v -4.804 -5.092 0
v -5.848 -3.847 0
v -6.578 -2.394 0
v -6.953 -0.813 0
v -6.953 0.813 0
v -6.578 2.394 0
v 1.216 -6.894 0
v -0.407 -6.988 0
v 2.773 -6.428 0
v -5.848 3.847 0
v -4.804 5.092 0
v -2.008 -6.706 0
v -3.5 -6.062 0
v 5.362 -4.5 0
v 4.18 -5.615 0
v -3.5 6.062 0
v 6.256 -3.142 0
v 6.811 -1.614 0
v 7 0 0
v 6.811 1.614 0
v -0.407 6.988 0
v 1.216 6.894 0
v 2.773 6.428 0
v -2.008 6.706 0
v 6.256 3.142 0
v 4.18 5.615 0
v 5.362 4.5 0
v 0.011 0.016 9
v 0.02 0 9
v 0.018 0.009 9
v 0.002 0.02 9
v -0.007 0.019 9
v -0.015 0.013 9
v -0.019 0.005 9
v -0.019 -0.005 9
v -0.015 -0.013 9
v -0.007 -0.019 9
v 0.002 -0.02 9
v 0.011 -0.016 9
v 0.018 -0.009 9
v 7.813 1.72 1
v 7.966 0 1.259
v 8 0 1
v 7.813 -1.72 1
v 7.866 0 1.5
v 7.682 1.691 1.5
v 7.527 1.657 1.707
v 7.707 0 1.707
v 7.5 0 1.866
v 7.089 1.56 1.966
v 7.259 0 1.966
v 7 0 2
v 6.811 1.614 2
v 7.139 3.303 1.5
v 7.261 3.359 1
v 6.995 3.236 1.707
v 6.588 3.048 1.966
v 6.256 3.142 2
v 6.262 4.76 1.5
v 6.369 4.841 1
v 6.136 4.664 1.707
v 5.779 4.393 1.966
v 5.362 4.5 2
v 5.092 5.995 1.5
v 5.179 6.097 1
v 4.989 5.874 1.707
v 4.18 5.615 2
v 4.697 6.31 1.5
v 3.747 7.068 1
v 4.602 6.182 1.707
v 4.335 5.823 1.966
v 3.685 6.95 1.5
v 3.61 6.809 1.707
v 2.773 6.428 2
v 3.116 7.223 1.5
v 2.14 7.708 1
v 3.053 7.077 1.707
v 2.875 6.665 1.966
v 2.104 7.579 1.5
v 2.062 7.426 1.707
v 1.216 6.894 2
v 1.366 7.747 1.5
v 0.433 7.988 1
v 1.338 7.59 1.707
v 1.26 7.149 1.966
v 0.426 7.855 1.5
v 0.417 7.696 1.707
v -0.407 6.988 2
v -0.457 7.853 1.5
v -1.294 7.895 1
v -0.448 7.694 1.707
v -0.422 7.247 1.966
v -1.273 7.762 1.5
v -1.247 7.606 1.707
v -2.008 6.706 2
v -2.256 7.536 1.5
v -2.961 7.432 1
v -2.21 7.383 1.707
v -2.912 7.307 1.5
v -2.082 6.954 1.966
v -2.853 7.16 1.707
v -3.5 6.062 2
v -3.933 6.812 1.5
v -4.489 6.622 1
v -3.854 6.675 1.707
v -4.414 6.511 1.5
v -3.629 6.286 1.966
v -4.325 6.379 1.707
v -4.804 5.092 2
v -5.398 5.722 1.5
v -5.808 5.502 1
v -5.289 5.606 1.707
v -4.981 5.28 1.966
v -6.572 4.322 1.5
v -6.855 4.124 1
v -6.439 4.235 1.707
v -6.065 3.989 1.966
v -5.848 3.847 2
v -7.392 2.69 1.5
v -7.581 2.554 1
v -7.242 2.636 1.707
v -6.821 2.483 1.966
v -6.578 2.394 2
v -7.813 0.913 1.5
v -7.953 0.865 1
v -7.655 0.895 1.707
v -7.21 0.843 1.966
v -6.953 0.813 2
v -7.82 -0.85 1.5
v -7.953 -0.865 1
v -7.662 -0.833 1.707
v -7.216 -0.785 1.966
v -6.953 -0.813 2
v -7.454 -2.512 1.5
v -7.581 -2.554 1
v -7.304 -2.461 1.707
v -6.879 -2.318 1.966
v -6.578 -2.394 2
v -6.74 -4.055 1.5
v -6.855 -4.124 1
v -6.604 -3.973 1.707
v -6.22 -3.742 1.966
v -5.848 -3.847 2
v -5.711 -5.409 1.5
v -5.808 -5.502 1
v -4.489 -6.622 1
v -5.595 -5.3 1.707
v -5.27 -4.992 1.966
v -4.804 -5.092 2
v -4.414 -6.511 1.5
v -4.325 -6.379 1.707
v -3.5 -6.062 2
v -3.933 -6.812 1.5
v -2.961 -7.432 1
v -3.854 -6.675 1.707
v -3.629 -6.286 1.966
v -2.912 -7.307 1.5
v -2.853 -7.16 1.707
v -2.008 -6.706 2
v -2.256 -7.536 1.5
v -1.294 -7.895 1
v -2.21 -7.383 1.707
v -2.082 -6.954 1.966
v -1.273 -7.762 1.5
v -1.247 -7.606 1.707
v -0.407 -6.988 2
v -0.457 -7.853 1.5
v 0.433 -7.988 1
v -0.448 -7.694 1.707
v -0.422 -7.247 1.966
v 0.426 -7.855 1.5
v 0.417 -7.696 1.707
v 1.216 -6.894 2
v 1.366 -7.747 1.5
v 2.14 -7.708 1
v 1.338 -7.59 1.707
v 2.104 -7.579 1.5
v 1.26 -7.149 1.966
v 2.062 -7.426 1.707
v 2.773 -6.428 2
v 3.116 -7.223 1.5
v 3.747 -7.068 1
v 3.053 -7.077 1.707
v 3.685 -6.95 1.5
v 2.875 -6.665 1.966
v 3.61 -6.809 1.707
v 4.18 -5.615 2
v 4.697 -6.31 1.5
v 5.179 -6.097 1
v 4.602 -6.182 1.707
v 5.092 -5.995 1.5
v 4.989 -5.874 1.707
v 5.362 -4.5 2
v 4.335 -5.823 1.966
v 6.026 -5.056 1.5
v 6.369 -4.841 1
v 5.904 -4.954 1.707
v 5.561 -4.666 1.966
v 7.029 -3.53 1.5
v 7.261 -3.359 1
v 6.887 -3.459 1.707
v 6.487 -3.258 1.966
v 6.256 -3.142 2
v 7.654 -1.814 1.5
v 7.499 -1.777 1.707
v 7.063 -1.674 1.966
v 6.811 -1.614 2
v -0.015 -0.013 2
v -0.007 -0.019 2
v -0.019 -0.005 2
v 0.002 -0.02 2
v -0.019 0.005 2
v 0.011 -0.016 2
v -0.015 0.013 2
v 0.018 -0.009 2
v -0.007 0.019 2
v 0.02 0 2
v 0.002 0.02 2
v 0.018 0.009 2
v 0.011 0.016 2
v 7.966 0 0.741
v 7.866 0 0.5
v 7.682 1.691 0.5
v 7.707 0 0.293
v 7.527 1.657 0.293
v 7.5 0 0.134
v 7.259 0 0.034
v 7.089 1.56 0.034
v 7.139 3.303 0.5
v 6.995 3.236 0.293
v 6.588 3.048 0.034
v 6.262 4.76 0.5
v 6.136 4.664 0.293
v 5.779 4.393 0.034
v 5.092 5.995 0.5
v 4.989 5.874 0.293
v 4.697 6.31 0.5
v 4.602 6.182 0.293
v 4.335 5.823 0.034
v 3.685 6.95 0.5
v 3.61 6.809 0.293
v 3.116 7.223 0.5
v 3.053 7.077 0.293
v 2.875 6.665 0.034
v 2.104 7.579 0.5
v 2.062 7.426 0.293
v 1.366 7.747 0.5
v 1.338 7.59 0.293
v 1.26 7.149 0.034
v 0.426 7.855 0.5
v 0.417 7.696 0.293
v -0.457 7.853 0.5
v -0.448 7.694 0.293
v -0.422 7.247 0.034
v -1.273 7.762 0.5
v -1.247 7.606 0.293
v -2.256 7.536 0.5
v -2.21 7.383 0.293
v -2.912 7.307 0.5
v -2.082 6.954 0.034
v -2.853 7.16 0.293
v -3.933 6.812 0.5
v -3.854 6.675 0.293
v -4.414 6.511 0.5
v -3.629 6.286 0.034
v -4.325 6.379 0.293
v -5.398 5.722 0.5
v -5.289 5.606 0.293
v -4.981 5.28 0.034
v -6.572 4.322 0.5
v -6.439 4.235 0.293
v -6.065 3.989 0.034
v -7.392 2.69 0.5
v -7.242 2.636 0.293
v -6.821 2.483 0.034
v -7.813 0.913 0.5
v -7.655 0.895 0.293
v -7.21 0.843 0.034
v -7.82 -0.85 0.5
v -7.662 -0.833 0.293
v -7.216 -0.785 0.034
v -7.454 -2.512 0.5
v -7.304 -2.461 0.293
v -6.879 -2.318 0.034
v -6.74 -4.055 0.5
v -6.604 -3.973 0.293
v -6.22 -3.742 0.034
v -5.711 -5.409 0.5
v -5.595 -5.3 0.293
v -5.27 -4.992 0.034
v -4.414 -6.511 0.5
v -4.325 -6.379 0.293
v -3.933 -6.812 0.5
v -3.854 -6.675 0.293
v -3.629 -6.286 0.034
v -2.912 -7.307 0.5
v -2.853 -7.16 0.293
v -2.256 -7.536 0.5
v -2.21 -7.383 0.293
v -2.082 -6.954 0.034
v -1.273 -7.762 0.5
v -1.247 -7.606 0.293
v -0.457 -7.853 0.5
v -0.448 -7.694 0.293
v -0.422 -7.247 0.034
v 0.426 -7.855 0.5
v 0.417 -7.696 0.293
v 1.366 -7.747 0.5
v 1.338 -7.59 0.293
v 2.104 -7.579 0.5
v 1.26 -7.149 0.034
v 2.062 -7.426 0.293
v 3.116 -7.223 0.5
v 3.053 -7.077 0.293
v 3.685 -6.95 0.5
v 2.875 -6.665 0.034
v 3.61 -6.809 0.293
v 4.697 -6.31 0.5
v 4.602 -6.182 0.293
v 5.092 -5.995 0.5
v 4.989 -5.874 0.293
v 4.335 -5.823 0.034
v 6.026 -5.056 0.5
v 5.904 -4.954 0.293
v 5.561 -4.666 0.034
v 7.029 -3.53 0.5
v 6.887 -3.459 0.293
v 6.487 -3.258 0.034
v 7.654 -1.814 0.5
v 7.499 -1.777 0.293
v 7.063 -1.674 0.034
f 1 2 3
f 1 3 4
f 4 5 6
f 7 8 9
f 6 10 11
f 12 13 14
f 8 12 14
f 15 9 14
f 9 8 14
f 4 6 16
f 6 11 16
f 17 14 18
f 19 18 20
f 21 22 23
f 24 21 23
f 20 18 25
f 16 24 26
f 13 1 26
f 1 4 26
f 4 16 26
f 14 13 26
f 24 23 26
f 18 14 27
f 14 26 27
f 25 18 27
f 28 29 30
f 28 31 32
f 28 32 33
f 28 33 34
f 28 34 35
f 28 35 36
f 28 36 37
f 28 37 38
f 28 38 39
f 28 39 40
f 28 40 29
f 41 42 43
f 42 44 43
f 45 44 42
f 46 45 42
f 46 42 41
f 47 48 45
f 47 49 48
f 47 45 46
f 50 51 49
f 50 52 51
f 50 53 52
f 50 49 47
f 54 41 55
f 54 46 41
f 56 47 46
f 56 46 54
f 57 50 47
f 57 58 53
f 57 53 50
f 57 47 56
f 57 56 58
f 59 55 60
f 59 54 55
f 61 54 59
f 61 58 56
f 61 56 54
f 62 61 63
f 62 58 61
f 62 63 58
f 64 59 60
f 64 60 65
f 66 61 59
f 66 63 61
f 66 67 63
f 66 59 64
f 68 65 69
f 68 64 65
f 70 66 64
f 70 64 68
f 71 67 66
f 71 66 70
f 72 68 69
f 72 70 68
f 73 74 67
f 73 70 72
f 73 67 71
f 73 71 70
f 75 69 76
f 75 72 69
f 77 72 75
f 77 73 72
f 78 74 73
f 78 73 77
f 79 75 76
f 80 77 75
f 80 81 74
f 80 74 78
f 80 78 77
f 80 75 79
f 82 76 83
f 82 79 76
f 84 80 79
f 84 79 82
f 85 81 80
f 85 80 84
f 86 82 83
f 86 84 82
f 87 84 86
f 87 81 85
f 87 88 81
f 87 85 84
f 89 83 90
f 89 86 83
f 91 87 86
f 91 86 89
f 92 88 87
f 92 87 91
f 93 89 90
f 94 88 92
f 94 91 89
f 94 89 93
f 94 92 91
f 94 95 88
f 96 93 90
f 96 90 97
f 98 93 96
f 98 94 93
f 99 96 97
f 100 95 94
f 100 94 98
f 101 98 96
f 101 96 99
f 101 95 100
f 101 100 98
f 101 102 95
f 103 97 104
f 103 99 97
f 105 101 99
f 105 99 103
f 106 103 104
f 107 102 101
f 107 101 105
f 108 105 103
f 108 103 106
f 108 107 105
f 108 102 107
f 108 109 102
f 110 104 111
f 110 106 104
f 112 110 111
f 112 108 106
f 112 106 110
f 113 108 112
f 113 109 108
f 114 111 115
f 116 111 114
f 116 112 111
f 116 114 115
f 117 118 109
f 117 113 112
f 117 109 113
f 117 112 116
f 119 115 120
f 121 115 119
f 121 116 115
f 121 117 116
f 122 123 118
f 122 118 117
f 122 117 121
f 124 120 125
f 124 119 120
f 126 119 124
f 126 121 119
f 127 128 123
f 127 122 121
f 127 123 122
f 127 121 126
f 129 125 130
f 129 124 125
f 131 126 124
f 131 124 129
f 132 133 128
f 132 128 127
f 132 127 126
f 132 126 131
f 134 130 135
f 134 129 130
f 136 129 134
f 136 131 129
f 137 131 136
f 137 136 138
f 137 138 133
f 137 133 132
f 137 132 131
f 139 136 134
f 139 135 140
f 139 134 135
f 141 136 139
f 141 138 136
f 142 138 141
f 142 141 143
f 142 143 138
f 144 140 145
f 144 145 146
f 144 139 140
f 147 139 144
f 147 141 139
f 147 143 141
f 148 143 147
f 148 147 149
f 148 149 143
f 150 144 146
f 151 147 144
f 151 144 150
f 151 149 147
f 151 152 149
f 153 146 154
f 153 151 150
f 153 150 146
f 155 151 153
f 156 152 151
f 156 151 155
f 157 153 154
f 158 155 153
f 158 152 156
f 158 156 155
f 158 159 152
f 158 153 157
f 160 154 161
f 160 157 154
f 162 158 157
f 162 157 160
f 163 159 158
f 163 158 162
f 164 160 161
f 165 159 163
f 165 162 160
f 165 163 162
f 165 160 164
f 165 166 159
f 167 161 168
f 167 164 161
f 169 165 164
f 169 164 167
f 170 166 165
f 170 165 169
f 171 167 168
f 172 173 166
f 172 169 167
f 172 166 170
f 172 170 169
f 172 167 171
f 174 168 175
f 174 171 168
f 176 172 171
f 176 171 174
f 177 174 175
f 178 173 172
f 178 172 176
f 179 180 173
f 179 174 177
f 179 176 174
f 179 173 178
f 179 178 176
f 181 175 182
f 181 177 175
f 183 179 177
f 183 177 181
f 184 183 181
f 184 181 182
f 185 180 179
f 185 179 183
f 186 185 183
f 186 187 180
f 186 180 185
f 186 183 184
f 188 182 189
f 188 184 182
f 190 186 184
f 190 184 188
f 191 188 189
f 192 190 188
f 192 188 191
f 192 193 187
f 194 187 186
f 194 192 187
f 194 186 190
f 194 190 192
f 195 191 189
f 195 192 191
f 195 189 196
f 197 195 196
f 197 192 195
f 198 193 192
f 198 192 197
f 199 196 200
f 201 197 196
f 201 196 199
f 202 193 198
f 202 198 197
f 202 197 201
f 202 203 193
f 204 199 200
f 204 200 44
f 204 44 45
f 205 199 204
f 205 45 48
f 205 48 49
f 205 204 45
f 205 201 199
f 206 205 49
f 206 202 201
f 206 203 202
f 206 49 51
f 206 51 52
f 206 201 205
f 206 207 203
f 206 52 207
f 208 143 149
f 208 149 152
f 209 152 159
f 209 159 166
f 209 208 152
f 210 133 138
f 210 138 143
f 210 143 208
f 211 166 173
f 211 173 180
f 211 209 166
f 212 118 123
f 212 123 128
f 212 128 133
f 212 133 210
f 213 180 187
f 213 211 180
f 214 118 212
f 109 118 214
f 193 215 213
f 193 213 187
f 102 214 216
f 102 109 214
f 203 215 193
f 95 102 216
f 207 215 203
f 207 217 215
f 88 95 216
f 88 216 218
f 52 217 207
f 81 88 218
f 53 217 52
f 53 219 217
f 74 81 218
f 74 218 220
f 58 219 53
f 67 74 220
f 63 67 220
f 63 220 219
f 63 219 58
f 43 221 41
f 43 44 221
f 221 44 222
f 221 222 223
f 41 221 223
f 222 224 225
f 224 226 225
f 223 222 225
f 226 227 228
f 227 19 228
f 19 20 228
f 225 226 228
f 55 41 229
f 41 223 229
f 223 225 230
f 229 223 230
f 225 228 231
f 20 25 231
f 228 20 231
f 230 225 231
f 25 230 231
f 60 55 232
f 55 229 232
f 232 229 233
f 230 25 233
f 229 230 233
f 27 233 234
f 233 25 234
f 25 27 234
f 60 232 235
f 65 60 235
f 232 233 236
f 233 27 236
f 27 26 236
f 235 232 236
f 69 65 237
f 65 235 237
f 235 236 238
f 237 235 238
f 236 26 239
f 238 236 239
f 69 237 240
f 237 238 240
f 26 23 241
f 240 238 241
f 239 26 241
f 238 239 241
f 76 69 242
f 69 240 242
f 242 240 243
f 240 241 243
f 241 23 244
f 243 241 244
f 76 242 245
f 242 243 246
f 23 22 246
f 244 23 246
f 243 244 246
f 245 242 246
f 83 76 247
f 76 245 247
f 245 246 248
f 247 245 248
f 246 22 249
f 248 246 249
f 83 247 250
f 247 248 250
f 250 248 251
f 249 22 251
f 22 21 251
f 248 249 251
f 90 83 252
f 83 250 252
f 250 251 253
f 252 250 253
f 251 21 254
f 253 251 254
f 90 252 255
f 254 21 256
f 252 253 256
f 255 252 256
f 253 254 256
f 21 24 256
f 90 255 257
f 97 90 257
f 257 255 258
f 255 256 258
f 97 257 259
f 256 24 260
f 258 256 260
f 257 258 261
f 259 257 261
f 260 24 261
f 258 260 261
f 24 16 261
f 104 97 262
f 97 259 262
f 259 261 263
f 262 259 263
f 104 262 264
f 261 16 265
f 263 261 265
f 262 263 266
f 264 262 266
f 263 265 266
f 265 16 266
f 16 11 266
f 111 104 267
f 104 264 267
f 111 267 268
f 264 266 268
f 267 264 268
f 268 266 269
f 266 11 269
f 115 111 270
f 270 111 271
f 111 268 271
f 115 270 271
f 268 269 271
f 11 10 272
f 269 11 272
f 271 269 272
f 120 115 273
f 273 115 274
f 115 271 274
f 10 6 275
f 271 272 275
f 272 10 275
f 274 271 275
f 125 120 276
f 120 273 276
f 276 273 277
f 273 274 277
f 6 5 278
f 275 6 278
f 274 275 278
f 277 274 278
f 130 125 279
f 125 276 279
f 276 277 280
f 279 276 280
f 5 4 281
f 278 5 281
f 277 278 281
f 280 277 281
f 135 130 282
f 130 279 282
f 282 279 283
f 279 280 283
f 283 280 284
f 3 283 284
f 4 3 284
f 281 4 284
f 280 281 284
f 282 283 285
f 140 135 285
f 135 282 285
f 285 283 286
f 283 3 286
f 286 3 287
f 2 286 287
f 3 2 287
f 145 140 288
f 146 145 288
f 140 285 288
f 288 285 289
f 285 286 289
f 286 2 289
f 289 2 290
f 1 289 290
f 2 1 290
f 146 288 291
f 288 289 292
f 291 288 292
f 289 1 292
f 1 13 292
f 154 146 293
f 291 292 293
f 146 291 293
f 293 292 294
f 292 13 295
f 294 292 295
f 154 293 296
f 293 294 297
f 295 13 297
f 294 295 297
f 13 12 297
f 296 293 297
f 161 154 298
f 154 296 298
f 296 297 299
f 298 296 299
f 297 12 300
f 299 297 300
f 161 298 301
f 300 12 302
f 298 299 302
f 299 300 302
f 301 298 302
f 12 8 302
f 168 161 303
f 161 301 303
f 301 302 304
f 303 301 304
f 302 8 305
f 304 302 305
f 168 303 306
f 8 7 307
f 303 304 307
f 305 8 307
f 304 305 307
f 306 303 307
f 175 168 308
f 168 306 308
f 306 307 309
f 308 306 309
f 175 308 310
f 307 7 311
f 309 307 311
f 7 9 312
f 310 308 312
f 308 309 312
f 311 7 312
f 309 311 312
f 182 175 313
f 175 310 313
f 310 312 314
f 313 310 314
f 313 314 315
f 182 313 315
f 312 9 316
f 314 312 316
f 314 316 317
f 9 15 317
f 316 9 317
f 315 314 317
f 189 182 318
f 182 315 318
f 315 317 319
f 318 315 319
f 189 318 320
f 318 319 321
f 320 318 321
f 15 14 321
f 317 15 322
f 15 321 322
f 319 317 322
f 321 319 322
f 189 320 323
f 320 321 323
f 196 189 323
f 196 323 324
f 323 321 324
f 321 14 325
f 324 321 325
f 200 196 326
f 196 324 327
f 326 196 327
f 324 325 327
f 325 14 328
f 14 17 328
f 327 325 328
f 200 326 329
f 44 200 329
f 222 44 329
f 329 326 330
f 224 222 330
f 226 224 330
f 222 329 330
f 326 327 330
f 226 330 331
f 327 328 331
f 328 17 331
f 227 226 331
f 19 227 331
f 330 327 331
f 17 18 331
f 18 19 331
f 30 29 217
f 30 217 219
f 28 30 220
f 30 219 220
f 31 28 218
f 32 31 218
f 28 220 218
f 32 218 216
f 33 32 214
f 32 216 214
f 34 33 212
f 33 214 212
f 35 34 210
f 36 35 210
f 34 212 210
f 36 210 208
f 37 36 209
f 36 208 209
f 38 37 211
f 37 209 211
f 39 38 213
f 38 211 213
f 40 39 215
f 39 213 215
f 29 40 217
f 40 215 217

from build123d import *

# Parameters (mm, degrees)
SKETCH1_R           = 8
BOSS_EXTRUDE1_DEPTH = 2
FILLET1_R           = 1
SKETCH3_R           = 0.02
BOSS_EXTRUDE2_DEPTH = 7


with BuildPart() as part:
    # Sketch1 → Boss-Extrude1 (new body)
    with BuildSketch(Plane.XY):
        Circle(SKETCH1_R)
    extrude(amount=BOSS_EXTRUDE1_DEPTH)

    # Fillet1
    fillet1_edges = [part.edges().sort_by_distance(p)[0] for p in [
        (-8, 0, 0),
        (-8, 0, 2),
    ]]
    fillet(fillet1_edges, radius=FILLET1_R - 0.0001)  # a hair under: the kernel refuses the full size

    # Sketch3 → Boss-Extrude2 (add)
    with BuildSketch(Plane.XY.offset(2)):
        Circle(SKETCH3_R)
    extrude(amount=BOSS_EXTRUDE2_DEPTH)


solid = part.part
